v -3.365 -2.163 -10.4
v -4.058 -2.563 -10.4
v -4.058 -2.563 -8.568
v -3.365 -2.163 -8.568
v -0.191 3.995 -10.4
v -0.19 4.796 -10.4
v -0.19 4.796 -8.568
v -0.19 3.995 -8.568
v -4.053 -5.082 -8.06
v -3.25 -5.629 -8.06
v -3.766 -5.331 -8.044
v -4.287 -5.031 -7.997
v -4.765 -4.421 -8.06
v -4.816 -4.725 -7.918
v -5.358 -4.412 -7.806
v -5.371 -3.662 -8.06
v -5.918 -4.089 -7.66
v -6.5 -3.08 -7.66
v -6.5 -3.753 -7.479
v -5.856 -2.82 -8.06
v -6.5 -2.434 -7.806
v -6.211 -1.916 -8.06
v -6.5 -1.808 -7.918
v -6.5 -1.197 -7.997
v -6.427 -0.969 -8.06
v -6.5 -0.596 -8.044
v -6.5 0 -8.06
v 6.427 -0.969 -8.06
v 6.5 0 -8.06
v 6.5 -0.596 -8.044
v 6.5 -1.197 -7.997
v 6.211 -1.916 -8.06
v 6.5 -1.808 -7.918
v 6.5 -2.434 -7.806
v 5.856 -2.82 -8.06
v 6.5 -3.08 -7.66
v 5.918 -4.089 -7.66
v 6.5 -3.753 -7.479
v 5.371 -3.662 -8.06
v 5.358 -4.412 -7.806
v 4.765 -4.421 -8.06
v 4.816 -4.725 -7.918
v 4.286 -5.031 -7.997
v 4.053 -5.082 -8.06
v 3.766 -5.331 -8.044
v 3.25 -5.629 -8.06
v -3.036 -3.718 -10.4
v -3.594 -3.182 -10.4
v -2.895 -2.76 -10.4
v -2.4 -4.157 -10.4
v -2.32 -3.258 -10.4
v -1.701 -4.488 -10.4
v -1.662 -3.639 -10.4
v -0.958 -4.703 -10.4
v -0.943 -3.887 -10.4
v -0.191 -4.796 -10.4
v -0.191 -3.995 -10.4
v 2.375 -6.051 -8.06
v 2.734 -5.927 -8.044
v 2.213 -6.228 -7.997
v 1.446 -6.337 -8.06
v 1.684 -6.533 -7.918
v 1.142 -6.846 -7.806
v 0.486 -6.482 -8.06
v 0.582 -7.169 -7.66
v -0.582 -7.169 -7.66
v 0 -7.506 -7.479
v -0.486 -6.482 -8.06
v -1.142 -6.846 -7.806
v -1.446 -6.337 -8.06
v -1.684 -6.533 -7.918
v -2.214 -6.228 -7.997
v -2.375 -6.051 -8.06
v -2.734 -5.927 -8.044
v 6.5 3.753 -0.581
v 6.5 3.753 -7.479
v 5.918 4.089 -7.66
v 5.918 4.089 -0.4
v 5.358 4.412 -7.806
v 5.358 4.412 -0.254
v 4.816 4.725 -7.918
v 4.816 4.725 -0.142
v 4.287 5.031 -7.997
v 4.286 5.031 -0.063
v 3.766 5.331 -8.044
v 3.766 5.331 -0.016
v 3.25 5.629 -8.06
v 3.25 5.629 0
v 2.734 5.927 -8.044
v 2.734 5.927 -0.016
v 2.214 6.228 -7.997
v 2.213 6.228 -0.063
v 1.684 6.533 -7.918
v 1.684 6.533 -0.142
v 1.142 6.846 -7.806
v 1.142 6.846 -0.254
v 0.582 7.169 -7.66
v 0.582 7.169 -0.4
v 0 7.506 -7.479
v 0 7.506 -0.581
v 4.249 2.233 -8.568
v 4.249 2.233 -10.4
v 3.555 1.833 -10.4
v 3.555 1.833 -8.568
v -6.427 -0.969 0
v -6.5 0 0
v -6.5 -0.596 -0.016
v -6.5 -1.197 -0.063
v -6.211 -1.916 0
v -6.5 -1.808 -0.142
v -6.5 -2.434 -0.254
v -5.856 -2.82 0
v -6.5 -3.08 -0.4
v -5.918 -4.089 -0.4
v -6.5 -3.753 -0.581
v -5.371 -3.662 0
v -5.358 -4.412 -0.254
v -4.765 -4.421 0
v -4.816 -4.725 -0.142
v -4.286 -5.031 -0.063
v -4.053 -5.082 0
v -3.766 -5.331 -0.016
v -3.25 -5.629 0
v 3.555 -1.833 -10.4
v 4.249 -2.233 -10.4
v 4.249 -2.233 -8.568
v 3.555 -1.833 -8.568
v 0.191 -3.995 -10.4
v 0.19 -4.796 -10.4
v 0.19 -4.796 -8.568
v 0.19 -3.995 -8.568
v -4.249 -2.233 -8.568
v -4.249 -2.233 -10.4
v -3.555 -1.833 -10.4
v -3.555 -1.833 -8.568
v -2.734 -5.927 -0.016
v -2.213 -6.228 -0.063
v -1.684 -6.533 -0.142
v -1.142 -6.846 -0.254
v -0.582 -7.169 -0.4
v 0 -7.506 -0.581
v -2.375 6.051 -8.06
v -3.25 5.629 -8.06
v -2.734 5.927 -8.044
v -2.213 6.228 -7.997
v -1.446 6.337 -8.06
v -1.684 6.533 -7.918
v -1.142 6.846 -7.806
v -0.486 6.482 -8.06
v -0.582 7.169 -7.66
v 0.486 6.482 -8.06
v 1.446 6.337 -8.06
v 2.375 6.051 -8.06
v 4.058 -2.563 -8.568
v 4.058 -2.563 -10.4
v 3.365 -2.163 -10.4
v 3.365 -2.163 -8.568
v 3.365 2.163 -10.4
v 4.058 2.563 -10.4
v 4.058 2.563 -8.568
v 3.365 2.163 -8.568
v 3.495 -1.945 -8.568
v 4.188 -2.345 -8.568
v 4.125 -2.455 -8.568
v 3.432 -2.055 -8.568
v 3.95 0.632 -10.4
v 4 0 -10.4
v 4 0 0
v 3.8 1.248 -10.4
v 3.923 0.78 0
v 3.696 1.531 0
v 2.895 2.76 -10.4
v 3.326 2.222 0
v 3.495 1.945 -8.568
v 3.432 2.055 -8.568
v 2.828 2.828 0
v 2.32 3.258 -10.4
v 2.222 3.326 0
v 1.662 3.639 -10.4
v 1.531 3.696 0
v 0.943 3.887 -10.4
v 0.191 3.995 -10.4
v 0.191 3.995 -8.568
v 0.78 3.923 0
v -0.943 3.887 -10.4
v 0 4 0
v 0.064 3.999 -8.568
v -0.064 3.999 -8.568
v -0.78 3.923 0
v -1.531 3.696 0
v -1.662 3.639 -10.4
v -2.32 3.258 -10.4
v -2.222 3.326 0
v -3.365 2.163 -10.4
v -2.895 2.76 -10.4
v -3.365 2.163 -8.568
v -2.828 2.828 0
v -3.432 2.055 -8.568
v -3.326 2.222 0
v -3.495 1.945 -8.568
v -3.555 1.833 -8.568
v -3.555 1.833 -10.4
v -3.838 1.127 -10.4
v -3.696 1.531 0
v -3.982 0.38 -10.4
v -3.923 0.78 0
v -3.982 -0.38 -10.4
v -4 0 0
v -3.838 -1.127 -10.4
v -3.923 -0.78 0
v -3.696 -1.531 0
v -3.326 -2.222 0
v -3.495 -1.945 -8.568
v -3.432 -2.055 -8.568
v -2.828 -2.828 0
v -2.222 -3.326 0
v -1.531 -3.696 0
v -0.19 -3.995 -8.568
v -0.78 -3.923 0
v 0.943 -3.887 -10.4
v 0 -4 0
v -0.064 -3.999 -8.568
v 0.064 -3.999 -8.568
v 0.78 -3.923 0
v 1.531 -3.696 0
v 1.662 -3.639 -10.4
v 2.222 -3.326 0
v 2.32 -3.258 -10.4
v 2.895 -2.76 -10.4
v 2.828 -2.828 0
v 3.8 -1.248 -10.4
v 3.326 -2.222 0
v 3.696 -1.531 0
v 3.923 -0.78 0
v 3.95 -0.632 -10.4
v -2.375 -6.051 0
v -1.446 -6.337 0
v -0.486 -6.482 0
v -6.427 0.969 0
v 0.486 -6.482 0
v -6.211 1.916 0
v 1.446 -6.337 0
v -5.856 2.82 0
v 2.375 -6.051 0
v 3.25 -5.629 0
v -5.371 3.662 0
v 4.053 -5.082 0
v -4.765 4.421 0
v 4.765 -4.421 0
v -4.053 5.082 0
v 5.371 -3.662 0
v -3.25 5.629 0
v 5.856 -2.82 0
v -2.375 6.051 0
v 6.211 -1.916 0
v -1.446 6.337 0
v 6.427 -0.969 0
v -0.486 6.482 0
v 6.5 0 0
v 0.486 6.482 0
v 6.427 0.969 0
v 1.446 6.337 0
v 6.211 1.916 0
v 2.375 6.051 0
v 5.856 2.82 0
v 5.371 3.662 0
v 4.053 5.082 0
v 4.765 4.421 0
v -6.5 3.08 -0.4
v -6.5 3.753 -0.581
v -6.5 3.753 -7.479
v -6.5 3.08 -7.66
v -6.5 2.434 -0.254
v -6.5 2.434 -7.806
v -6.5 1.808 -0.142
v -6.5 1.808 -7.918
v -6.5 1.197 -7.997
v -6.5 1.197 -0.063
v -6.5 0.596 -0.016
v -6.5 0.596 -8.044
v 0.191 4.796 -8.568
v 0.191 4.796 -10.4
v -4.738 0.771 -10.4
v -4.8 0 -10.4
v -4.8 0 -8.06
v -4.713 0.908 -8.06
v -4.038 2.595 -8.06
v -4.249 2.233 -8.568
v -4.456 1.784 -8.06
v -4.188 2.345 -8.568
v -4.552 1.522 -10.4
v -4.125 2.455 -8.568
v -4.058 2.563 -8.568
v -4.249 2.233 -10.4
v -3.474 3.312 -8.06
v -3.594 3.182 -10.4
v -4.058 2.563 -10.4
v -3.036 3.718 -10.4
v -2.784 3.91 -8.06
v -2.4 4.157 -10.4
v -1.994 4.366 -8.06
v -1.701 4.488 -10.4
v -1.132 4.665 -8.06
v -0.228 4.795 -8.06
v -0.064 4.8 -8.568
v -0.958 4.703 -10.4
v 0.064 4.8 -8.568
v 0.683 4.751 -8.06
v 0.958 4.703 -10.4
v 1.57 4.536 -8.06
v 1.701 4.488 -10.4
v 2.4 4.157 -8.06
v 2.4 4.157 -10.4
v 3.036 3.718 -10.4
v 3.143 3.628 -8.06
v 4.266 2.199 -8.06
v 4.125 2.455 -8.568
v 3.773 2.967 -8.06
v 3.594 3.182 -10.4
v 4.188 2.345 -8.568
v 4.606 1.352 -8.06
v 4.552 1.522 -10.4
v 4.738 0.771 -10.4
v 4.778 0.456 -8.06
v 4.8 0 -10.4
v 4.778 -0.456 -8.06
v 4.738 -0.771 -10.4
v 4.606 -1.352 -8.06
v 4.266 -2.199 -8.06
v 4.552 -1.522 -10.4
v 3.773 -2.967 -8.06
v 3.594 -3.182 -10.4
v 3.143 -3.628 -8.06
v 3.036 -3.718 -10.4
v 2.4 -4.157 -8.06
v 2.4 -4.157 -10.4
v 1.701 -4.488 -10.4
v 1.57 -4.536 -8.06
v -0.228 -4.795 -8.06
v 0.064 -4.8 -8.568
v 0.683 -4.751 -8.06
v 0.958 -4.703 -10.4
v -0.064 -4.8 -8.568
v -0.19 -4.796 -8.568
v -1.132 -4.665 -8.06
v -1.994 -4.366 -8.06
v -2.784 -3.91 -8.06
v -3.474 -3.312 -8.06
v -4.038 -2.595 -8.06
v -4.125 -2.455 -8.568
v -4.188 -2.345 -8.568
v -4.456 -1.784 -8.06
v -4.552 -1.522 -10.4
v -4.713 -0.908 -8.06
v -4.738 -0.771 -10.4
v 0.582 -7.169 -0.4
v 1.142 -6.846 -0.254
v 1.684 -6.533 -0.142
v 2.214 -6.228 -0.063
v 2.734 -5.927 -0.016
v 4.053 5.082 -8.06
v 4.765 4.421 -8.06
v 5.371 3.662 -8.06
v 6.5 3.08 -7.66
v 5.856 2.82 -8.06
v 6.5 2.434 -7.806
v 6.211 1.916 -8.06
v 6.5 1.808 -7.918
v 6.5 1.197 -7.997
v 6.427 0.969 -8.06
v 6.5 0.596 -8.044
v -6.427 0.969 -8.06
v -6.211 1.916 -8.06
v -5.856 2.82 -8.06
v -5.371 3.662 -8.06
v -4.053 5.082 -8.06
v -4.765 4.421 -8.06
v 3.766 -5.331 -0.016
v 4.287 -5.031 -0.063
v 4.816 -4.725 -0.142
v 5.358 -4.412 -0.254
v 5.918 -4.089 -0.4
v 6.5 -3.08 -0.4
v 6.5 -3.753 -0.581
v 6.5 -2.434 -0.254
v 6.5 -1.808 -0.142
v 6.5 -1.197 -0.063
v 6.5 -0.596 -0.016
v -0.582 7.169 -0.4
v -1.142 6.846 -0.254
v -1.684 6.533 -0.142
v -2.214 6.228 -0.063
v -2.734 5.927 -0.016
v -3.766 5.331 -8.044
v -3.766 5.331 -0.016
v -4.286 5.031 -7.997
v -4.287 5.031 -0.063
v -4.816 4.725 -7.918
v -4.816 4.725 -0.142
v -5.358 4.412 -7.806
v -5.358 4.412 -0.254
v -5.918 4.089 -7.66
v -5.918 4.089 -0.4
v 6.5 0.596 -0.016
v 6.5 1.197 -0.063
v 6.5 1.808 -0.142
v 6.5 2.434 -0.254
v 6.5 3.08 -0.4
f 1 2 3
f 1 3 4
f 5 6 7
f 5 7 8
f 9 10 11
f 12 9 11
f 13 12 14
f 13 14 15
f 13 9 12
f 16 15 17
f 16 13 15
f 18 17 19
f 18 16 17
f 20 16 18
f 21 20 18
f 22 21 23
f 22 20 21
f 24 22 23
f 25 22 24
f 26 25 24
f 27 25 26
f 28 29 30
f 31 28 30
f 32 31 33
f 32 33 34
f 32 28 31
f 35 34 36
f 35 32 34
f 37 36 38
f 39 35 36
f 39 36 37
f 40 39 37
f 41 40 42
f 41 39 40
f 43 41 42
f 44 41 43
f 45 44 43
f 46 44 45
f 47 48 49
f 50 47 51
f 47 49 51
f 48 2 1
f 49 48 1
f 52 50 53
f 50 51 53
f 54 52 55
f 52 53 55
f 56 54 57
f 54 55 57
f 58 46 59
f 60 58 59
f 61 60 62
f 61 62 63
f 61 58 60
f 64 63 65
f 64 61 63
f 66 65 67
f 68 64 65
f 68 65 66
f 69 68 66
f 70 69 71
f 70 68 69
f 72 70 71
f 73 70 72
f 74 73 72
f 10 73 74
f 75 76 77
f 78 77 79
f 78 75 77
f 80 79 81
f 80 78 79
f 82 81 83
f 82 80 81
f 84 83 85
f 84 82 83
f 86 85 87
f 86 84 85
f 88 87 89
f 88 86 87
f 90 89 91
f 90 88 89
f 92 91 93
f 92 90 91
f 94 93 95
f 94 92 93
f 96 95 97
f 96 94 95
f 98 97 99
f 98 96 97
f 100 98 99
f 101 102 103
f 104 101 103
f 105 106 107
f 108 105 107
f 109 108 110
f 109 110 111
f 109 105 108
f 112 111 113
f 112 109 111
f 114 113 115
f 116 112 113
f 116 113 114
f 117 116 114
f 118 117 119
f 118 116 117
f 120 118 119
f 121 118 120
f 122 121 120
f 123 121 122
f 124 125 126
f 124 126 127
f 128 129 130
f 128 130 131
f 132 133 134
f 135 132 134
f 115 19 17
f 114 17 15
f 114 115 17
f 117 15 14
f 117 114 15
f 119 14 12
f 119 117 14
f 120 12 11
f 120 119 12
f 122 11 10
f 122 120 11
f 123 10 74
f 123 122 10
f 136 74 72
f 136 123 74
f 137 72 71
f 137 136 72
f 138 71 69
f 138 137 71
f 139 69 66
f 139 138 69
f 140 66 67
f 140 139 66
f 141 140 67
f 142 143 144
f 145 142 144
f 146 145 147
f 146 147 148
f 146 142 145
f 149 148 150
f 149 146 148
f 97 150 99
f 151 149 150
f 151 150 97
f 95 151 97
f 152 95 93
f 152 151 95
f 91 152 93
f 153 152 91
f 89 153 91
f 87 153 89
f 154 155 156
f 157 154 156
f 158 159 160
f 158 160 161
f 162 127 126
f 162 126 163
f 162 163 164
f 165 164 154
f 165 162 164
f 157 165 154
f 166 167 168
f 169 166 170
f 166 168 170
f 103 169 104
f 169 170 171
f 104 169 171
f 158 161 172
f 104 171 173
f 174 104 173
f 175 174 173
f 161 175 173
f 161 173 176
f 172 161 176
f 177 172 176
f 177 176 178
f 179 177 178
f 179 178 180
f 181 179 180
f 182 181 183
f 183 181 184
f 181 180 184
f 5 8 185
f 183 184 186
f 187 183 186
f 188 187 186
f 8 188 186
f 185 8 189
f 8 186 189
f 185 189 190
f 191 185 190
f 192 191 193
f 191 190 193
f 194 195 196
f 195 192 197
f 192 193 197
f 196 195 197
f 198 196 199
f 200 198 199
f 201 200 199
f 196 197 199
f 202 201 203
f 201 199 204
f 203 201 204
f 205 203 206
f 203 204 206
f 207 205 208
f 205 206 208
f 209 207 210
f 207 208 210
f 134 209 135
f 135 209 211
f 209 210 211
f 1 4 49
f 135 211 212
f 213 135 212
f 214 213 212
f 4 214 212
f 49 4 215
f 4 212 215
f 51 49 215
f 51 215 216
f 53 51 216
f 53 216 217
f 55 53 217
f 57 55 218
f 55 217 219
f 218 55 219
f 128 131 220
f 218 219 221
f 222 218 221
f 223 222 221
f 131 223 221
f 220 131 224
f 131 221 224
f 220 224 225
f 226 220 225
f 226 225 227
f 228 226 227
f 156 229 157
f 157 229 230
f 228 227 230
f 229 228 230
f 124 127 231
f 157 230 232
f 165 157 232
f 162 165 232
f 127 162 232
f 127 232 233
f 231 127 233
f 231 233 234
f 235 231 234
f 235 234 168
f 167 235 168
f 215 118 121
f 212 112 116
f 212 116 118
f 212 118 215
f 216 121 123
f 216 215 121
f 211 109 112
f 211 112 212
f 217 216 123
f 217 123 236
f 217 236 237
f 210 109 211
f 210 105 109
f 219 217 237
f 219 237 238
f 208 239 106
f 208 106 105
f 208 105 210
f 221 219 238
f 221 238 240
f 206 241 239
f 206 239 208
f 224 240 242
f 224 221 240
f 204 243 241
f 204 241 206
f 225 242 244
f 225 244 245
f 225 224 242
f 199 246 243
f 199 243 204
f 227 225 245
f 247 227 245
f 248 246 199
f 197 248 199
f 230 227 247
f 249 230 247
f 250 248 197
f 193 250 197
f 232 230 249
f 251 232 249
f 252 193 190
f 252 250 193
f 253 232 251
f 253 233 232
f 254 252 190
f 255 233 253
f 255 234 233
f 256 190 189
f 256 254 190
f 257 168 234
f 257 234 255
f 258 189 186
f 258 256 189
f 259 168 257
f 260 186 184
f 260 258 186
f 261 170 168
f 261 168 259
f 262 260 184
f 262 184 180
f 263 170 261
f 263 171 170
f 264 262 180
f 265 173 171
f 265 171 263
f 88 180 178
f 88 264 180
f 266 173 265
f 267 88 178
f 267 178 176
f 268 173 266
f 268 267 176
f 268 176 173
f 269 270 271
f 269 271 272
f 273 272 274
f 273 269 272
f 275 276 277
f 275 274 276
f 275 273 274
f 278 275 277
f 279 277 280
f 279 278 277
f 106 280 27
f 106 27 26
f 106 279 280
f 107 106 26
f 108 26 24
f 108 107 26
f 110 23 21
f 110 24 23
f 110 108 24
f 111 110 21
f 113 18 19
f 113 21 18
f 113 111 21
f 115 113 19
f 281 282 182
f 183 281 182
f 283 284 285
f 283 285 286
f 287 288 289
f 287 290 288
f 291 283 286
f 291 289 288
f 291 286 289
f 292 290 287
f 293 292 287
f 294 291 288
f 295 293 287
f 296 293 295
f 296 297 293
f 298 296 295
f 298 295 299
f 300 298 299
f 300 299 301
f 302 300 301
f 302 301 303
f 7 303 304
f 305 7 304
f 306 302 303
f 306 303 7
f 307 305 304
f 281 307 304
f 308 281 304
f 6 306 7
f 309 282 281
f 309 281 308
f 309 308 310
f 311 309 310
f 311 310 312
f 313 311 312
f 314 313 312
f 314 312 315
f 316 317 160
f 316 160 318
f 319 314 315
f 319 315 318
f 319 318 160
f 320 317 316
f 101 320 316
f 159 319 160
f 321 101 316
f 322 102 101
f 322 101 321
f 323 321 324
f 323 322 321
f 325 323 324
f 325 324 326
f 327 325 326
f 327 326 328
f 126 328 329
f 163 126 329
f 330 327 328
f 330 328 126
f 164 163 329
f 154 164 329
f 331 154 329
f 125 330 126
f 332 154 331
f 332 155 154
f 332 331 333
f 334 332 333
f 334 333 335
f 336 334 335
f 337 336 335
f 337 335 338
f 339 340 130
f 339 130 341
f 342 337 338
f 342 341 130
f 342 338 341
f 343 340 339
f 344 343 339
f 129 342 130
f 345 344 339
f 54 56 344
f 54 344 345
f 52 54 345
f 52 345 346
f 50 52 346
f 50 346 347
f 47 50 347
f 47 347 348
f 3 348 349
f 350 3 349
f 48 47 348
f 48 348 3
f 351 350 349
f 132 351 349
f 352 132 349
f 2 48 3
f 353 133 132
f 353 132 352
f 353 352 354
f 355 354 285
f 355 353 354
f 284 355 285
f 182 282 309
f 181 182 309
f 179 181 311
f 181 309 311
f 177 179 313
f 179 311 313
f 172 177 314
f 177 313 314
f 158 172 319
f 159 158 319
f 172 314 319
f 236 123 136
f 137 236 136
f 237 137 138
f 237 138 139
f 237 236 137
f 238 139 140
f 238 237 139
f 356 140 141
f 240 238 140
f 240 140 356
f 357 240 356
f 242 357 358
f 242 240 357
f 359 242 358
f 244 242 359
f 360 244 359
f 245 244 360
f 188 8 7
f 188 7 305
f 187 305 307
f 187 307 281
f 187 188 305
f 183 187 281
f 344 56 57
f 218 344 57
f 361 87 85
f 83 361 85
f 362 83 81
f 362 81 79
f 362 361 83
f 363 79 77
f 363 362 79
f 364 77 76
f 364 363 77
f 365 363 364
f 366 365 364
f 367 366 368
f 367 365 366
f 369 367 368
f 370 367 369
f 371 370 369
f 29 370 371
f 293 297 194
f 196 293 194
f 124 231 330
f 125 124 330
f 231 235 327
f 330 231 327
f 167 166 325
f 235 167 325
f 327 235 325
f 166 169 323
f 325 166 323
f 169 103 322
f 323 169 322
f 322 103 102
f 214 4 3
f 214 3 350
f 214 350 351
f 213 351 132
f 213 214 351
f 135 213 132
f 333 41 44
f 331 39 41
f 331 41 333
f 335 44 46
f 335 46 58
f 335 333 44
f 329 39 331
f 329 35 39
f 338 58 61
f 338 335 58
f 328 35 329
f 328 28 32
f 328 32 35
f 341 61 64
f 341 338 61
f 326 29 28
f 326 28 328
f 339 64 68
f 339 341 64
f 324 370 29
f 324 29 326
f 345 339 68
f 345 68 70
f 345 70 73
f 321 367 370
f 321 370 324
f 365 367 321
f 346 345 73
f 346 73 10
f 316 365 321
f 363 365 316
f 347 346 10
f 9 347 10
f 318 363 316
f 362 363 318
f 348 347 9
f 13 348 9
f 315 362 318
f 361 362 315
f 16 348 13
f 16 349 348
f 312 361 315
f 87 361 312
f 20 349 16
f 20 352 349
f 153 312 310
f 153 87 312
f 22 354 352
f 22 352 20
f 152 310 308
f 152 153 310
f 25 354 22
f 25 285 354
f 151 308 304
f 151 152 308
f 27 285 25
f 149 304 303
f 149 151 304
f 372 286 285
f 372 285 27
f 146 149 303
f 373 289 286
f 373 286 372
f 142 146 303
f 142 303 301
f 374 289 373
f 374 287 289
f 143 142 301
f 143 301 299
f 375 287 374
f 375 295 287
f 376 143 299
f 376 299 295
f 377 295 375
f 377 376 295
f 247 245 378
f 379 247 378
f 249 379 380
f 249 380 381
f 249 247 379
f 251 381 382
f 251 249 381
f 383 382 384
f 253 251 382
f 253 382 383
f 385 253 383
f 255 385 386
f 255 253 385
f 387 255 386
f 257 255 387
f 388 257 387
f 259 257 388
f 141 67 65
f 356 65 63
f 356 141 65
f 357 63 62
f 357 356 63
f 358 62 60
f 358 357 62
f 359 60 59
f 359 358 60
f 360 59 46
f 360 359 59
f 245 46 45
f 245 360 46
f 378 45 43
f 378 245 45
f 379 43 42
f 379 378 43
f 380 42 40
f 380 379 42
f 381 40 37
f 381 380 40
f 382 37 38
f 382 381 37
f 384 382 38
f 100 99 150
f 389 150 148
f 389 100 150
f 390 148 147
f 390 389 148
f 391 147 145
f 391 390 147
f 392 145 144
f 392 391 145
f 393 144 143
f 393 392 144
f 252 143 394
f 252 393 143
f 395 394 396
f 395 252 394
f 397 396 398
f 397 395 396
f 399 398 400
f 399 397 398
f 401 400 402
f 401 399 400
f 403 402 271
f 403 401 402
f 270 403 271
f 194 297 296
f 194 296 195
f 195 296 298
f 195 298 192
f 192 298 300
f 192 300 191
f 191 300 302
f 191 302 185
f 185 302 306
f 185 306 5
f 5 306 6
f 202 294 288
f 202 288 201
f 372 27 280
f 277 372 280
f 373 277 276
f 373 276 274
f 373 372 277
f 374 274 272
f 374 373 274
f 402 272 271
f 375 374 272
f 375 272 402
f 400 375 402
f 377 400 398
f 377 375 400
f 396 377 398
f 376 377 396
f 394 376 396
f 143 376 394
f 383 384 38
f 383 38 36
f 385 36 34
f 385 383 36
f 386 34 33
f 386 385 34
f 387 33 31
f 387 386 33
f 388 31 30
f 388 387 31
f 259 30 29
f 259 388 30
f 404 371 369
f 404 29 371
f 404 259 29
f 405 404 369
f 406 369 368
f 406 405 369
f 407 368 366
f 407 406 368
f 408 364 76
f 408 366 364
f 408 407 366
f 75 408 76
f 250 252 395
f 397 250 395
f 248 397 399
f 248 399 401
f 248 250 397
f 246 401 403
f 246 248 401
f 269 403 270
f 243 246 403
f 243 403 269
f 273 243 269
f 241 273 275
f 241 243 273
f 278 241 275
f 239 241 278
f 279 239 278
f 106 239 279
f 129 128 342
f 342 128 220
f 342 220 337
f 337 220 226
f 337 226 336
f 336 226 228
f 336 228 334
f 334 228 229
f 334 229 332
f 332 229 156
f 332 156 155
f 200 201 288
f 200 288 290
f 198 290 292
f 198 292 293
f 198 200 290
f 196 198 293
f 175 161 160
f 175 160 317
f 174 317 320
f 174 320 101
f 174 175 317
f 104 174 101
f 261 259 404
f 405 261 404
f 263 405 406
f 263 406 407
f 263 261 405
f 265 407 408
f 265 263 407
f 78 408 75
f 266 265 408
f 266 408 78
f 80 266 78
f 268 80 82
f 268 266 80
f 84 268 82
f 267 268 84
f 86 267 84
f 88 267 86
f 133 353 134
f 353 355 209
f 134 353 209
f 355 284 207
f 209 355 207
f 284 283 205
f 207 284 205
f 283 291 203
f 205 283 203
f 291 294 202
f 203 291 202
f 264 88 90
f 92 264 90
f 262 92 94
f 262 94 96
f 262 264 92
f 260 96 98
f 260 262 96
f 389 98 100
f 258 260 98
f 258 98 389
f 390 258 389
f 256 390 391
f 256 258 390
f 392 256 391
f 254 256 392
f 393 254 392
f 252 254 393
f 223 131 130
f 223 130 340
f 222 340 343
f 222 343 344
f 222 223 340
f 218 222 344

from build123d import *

# Parameters (mm, degrees)
EXTRUDE1_DEPTH          = 10.4
SKETCH2_OUTSIDE_W       = 72.756
SKETCH2_OUTSIDE_H       = 74.768
SKETCH2_OUTSIDE_R       = 6.5
CUT_EXTRUDE1_DEPTH      = 15.37857202
CUT_EXTRUDE1_DRAFT      = -60
SKETCH4_R               = 4
CUT_EXTRUDE3_DEPTH      = 15.37857202
SKETCH12_OUTSIDE_W      = 19.484
SKETCH12_OUTSIDE_H      = 21.496
SKETCH12_OUTSIDE_R      = 4.8
CUT_EXTRUDE10_DEPTH     = 2.34
SKETCH15_W              = 0.381
SKETCH15_H              = 7.505553499
CUT_EXTRUDE_THIN2_DEPTH = 1.832
CIRPATTERN1_COUNT       = 6
SKETCH3_OUTSIDE_W       = 67.248
SKETCH3_OUTSIDE_H       = 69.26
SKETCH3_OUTSIDE_R       = 6.5
CUT_EXTRUDE2_DEPTH      = 13.788546959
CUT_EXTRUDE2_DRAFT      = -60


with BuildPart() as part:
    # Sketch1 → Extrude1 (new body)
    with BuildSketch(Plane.XY):
        Polygon((0, 7.505553499), (-6.5, 3.75277675), (-6.5, -3.75277675), (0, -7.505553499), (6.5, -3.75277675), (6.5, 3.75277675), align=None)
    extrude(amount=-EXTRUDE1_DEPTH)


with BuildPart() as cut_extrude1_tool:
    # Sketch2 outside → Cut-Extrude1 (with draft: the straight prism first)
    with BuildSketch(Plane.XY):
        Rectangle(SKETCH2_OUTSIDE_W, SKETCH2_OUTSIDE_H)
        Circle(SKETCH2_OUTSIDE_R, mode=Mode.SUBTRACT)
    extrude(amount=-CUT_EXTRUDE1_DEPTH)
    # Cut-Extrude1: the draft: its side faces are tilted about the plane it starts from
    cut_extrude1_sides = [cut_extrude1_tool.faces().sort_by_distance(p)[0] for p in [
        (0, -37.384, -7.68928601),
        (36.378, 0, -7.68928601),
        (0, 37.384, -7.68928601),
        (-36.378, 0, -7.68928601),
        (-6.5, 0, -7.68928601),
    ]]
    draft(cut_extrude1_sides, Plane.XY, CUT_EXTRUDE1_DRAFT)


with BuildPart() as part_1:
    add(part.part)

    # Cut-Extrude1: cut by cut_extrude1_tool
    add(cut_extrude1_tool.part, mode=Mode.SUBTRACT)

    # Sketch4 → Cut-Extrude3 (cut, through all)
    with BuildSketch(Plane.XY):
        Circle(SKETCH4_R)
    extrude(amount=-CUT_EXTRUDE3_DEPTH, mode=Mode.SUBTRACT)

    # Sketch12 outside → Cut-Extrude10 (cut)
    with BuildSketch(Plane(origin=(0, 0, -10.4), x_dir=(-1, 0, 0), z_dir=(0, 0, -1))):
        Rectangle(SKETCH12_OUTSIDE_W, SKETCH12_OUTSIDE_H)
        Circle(SKETCH12_OUTSIDE_R, mode=Mode.SUBTRACT)
    extrude(amount=-CUT_EXTRUDE10_DEPTH, mode=Mode.SUBTRACT)

    # Sketch15 → Cut-Extrude-Thin2 (cut)
    with BuildSketch(Plane(origin=(0, 0, -10.4), x_dir=(-1, 0, 0), z_dir=(0, 0, -1))):
        with Locations((0, -3.75277675)):
            Rectangle(SKETCH15_W, SKETCH15_H)
    cut_extrude_thin2 = extrude(amount=-CUT_EXTRUDE_THIN2_DEPTH, mode=Mode.SUBTRACT)

    # CirPattern1: Cut-Extrude-Thin2 ×6 about axis
    cirpattern1_axis = Axis((0, 0, 0), (0, 0, 1))
    for i in range(1, CIRPATTERN1_COUNT):
        add(cut_extrude_thin2.rotate(cirpattern1_axis, i * 360 / CIRPATTERN1_COUNT), mode=Mode.SUBTRACT)


with BuildPart() as cut_extrude2_tool:
    # Sketch3 outside → Cut-Extrude2 (with draft: the straight prism first)
    with BuildSketch(Plane(origin=(0, 0, -8.06), x_dir=(-1, 0, 0), z_dir=(0, 0, -1))):
        Rectangle(SKETCH3_OUTSIDE_W, SKETCH3_OUTSIDE_H)
        Circle(SKETCH3_OUTSIDE_R, mode=Mode.SUBTRACT)
    extrude(amount=-CUT_EXTRUDE2_DEPTH)
    # Cut-Extrude2: the draft: its side faces are tilted about the plane it starts from
    cut_extrude2_sides = [cut_extrude2_tool.faces().sort_by_distance(p)[0] for p in [
        (0, -34.63, -1.16572652),
        (-33.624, 0, -1.16572652),
        (0, 34.63, -1.16572652),
        (33.624, 0, -1.16572652),
        (6.5, 0, -1.16572652),
    ]]
    draft(cut_extrude2_sides, Plane(origin=(0, 0, -8.06), x_dir=(-1, 0, 0), z_dir=(0, 0, -1)), CUT_EXTRUDE2_DRAFT)


with BuildPart() as part_2:
    add(part_1.part)

    # Cut-Extrude2: cut by cut_extrude2_tool
    add(cut_extrude2_tool.part, mode=Mode.SUBTRACT)


solid = part_2.part
